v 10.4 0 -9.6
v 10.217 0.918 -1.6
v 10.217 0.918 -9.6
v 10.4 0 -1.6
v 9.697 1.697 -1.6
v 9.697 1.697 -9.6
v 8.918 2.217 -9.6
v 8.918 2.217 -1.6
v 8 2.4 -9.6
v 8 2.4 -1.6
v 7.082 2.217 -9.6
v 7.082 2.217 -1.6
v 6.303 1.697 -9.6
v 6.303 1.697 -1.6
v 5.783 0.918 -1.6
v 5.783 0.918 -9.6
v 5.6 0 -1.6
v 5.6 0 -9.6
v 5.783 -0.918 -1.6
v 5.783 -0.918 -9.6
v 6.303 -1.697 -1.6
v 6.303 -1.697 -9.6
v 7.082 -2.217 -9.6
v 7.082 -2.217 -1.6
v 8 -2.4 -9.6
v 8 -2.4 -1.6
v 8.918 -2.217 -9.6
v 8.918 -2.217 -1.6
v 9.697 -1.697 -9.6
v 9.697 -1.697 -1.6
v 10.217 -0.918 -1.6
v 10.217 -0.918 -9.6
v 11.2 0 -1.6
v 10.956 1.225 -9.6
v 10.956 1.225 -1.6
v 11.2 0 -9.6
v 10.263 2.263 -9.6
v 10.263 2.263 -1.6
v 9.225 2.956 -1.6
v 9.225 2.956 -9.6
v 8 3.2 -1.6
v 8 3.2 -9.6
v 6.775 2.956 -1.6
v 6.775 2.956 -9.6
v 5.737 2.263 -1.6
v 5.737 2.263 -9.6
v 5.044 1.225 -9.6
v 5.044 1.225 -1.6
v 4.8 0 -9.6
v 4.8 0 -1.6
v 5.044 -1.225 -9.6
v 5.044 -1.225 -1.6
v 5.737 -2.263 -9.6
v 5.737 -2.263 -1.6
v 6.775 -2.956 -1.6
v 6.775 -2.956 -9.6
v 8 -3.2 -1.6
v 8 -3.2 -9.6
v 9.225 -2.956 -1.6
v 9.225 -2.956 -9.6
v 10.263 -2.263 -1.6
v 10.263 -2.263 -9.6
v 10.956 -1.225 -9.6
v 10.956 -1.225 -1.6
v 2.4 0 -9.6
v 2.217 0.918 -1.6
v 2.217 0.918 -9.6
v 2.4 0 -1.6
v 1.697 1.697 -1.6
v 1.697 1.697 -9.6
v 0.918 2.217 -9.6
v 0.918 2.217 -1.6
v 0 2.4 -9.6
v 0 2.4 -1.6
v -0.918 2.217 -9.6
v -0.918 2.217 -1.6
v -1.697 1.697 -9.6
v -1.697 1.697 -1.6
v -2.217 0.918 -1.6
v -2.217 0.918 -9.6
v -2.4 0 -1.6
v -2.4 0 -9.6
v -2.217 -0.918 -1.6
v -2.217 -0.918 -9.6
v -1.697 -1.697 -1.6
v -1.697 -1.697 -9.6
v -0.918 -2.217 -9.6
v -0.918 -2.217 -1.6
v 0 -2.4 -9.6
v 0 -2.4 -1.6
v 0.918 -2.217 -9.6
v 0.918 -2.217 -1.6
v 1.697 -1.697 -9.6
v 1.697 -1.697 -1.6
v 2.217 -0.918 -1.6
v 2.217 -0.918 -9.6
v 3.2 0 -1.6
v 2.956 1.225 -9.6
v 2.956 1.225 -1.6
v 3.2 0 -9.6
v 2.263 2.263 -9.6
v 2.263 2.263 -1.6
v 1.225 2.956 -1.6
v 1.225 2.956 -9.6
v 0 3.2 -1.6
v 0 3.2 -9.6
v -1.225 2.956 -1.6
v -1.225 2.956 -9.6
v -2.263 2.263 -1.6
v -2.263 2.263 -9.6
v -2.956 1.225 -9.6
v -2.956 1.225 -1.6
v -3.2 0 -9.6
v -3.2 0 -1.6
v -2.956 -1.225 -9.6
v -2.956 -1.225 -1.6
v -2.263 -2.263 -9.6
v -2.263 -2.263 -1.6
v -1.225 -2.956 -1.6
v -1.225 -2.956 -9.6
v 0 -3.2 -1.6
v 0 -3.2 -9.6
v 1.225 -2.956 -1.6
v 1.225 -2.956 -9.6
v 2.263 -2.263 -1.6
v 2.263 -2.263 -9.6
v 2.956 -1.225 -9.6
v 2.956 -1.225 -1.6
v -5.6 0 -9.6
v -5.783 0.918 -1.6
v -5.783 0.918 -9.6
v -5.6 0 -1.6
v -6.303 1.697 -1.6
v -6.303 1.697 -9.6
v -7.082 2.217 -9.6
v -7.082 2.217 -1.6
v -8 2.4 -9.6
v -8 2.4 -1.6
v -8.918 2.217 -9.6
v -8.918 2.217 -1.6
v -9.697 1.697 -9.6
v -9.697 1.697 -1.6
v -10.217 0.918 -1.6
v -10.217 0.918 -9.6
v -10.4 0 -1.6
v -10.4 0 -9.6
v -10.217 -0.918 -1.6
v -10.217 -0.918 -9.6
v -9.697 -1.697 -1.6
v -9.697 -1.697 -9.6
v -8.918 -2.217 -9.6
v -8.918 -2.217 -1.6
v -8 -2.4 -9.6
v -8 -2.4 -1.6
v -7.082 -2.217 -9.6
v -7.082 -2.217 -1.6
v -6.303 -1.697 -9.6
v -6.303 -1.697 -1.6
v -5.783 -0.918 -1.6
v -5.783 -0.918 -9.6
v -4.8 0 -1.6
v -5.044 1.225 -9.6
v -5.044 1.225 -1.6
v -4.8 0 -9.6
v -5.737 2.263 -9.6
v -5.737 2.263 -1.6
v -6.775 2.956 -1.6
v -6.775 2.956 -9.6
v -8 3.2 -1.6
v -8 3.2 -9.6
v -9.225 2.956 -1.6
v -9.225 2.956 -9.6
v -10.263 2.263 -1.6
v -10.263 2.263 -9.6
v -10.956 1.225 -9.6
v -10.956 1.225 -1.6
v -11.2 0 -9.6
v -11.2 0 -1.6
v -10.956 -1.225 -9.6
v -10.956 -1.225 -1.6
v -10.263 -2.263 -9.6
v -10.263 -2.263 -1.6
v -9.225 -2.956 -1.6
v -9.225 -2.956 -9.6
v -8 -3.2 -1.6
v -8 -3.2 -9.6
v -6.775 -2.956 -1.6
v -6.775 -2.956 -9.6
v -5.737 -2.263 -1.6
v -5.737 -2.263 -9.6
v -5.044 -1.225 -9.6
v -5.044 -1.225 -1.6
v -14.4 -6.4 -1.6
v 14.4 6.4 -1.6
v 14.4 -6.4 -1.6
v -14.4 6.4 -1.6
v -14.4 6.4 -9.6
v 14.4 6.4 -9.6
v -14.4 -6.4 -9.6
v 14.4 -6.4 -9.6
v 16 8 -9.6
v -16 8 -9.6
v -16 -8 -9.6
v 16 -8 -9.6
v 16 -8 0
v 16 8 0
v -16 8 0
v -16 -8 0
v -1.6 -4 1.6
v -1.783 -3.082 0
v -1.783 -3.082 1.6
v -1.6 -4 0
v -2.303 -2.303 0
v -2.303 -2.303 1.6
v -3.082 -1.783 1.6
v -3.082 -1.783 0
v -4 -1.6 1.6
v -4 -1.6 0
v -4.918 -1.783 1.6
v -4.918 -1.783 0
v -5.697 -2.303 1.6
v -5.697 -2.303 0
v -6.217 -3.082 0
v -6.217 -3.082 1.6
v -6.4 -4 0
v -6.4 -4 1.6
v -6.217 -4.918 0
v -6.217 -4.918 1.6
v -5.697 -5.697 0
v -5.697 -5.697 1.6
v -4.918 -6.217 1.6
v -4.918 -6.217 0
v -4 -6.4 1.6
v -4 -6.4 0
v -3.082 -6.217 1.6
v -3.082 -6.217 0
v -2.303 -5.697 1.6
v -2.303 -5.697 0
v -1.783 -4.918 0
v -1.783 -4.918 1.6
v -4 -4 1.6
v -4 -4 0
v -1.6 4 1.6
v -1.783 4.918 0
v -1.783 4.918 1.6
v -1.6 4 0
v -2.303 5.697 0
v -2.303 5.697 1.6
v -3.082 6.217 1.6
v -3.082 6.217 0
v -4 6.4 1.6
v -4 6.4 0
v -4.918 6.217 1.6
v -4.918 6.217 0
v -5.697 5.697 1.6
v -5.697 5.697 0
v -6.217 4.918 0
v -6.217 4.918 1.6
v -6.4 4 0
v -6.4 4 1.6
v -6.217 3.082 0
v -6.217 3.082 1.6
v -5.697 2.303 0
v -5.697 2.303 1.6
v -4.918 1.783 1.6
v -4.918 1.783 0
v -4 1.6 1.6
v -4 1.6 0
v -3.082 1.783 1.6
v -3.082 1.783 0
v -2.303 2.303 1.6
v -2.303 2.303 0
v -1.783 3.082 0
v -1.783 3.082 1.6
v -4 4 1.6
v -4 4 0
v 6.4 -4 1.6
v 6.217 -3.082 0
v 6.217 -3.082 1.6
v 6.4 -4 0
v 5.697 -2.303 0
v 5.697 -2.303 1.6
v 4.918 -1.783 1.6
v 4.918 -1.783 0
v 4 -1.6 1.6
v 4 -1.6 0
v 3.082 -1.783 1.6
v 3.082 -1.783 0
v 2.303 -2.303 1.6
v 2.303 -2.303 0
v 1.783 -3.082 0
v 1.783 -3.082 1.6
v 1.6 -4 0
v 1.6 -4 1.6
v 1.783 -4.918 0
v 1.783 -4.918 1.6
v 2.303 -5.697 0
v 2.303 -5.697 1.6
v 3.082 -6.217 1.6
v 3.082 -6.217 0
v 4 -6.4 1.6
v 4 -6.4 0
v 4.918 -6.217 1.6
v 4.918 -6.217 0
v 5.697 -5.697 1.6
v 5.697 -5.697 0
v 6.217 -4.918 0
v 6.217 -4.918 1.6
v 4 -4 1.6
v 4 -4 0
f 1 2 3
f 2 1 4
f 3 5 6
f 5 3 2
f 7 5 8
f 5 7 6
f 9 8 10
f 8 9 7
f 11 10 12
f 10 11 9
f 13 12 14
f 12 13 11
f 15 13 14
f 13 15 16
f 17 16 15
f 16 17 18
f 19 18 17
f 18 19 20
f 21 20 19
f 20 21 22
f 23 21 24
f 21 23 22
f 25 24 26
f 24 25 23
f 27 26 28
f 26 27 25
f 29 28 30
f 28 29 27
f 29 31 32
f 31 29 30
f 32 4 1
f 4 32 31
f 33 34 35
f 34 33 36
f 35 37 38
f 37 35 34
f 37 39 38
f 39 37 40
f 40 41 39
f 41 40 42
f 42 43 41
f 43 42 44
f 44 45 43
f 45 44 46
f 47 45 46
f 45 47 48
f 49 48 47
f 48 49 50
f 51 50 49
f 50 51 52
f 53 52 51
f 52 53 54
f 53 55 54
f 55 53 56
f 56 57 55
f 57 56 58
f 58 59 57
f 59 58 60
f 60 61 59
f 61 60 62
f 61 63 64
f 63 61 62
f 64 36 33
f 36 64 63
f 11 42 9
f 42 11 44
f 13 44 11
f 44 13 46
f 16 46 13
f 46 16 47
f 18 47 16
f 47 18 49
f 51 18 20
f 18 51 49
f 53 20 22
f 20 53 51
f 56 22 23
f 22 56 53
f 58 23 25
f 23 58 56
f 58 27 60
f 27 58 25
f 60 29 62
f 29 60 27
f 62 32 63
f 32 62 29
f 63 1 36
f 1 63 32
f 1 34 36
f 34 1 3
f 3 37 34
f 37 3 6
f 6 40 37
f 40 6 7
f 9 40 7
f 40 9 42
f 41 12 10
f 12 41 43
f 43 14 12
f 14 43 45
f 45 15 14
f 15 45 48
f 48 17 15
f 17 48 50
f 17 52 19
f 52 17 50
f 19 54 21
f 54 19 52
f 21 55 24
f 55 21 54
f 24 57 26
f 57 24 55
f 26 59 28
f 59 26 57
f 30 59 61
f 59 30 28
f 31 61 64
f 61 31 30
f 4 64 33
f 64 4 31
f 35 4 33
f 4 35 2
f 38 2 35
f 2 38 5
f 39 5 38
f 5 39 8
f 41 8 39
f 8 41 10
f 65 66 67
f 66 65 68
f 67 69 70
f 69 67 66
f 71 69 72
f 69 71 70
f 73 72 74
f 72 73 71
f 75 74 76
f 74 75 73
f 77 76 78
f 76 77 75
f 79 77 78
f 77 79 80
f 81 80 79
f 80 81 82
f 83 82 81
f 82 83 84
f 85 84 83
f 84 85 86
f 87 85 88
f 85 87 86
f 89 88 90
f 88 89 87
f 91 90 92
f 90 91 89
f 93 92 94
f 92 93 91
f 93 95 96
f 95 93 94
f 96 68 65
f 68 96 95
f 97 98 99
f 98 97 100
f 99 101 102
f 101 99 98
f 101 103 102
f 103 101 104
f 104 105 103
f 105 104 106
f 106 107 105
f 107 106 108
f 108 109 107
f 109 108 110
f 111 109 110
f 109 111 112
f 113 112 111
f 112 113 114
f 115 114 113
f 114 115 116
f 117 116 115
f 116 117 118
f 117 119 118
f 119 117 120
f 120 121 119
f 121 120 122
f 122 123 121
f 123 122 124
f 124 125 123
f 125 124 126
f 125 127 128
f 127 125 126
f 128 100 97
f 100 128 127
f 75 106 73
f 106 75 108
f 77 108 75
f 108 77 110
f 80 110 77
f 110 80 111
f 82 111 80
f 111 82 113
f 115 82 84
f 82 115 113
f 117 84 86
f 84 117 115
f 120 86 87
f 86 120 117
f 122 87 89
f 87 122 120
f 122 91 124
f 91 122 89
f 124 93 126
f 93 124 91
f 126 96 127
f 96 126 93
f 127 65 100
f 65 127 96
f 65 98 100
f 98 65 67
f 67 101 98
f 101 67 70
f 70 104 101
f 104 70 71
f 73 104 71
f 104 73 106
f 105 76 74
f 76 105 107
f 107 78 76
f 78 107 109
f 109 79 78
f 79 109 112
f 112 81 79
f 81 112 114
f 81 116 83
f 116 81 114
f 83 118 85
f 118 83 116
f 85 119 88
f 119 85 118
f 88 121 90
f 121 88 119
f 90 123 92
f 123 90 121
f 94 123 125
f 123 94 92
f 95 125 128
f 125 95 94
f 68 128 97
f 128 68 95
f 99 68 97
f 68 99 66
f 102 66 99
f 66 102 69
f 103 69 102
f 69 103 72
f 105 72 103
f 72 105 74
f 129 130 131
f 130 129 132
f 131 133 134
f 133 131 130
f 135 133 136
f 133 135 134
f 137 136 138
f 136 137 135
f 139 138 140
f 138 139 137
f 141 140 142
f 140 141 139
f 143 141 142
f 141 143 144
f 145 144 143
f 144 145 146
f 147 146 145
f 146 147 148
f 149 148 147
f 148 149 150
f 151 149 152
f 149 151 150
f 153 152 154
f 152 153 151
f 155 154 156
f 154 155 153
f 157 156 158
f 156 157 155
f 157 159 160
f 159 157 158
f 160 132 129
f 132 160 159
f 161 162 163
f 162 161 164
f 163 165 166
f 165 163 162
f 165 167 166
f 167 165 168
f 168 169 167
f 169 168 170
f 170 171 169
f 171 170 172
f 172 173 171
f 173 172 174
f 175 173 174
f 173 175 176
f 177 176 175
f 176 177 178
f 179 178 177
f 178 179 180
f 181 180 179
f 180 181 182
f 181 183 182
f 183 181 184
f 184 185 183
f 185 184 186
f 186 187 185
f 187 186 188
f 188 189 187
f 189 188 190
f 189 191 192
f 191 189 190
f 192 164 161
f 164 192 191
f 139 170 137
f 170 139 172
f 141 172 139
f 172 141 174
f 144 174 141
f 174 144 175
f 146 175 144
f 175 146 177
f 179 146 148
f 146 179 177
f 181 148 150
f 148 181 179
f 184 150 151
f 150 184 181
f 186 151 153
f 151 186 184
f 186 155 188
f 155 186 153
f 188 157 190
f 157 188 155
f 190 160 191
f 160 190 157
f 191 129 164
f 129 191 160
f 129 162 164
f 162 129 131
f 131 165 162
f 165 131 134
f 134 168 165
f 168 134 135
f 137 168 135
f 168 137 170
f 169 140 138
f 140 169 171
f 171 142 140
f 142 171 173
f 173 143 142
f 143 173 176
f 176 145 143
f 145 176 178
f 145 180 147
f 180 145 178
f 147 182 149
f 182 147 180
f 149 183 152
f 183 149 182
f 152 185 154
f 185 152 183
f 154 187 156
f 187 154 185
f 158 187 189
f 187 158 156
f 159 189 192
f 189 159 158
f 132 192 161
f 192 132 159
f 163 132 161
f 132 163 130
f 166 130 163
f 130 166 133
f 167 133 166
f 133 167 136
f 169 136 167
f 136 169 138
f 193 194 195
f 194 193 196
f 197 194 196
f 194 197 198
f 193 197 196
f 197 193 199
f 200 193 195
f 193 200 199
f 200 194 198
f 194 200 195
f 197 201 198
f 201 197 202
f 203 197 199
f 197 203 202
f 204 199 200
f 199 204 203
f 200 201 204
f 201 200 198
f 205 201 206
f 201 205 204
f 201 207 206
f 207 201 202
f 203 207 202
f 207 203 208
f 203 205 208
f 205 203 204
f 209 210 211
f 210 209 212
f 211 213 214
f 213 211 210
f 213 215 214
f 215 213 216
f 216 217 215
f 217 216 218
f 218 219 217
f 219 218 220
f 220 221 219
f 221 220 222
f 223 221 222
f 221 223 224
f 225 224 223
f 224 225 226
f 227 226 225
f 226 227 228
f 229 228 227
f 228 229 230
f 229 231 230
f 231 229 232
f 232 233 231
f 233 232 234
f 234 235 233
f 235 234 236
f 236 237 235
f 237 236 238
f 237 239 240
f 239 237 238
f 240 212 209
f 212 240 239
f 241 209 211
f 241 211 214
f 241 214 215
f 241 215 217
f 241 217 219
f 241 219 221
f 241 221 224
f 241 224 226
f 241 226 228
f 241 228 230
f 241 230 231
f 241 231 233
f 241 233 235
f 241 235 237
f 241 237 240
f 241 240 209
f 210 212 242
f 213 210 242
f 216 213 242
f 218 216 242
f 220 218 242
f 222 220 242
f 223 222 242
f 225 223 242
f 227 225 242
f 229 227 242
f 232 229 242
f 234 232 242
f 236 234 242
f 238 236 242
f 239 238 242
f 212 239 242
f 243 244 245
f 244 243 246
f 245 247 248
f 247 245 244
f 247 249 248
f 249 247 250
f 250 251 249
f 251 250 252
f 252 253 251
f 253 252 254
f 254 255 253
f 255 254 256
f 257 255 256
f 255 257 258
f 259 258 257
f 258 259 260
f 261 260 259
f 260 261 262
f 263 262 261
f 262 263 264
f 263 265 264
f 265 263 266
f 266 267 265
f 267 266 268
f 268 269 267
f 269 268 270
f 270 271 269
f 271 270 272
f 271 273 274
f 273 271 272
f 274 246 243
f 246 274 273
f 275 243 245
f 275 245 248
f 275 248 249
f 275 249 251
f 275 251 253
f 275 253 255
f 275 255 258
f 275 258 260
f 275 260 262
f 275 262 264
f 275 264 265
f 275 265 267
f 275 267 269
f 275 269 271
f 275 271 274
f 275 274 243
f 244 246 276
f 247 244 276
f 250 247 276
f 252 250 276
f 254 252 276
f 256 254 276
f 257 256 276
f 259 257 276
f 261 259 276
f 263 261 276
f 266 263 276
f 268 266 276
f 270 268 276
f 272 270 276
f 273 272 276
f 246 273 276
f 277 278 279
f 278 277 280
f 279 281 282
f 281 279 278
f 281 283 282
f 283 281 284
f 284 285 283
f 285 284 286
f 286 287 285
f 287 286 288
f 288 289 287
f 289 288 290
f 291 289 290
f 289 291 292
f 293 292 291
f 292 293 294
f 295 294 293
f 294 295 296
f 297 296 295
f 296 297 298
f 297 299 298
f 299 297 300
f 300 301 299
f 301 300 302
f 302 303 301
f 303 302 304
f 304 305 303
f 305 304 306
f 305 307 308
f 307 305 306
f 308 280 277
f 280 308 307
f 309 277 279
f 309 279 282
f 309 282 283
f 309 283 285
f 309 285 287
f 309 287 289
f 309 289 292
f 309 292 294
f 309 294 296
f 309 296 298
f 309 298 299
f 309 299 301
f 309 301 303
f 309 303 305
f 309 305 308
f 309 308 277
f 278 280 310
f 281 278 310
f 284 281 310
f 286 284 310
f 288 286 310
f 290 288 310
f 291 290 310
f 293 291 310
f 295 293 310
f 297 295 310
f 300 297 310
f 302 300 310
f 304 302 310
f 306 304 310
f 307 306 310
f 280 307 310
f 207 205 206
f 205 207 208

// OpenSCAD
// file: ../p/4-4ring3.scad
use <../lib.scad>
$fa=1; $fs=0.2;
function ldraw_lib__4_4ring3(realsolid=false) = [
// 0 Ring  3 x 1.0
// 0 Name: 4-4ring3.dat
// 0 Author: James Jessiman
// 0 !LDRAW_ORG Primitive UPDATE 2009-01
// 0 !LICENSE Licensed under CC BY 2.0 and CC BY 4.0 : see CAreadme.txt
// 
// 0 BFC CERTIFY CCW
  [0,"BFC","CERTIFY"],
  [0,"BFC","CCW"],
// 
// 0 !HISTORY 1998-12-15 [PTadmin] Official Update 1998-10
// 0 !HISTORY 2002-04-05 [hafhead] Added BFC statement
// 0 !HISTORY 2002-04-25 [PTadmin] Official Update 2002-02
// 0 !HISTORY 2007-06-24 [PTadmin] Header formatted for Contributor Agreement
// 0 !HISTORY 2008-07-01 [PTadmin] Official Update 2008-01
// 0 !HISTORY 2008-08-26 [cwdee] Switch polygon winding and rename
// 0 !HISTORY 2009-05-02 [PTadmin] Official Update 2009-01
// 
// 
// 4 16 -1.5308 0 3.6956 -1.1481 0 2.7717 0 0 3 0 0 4
  [4,16,-1.5308,0,3.6956,-1.1481,0,2.7717,0,0,3,0,0,4],
// 4 16 -2.8284 0 2.8284 -2.1213 0 2.1213 -1.1481 0 2.7717 -1.5308 0 3.6956
  [4,16,-2.8284,0,2.8284,-2.1213,0,2.1213,-1.1481,0,2.7717,-1.5308,0,3.6956],
// 4 16 -3.6956 0 1.5308 -2.7717 0 1.1481 -2.1213 0 2.1213 -2.8284 0 2.8284
  [4,16,-3.6956,0,1.5308,-2.7717,0,1.1481,-2.1213,0,2.1213,-2.8284,0,2.8284],
// 4 16 -4 0 0 -3 0 0 -2.7717 0 1.1481 -3.6956 0 1.5308
  [4,16,-4,0,0,-3,0,0,-2.7717,0,1.1481,-3.6956,0,1.5308],
// 4 16 -3.6956 0 -1.5308 -2.7717 0 -1.1481 -3 0 0 -4 0 0
  [4,16,-3.6956,0,-1.5308,-2.7717,0,-1.1481,-3,0,0,-4,0,0],
// 4 16 -2.8284 0 -2.8284 -2.1213 0 -2.1213 -2.7717 0 -1.1481 -3.6956 0 -1.5308
  [4,16,-2.8284,0,-2.8284,-2.1213,0,-2.1213,-2.7717,0,-1.1481,-3.6956,0,-1.5308],
// 4 16 -1.5308 0 -3.6956 -1.1481 0 -2.7717 -2.1213 0 -2.1213 -2.8284 0 -2.8284
  [4,16,-1.5308,0,-3.6956,-1.1481,0,-2.7717,-2.1213,0,-2.1213,-2.8284,0,-2.8284],
// 4 16 0 0 -4 0 0 -3 -1.1481 0 -2.7717 -1.5308 0 -3.6956
  [4,16,0,0,-4,0,0,-3,-1.1481,0,-2.7717,-1.5308,0,-3.6956],
// 4 16 1.5308 0 -3.6956 1.1481 0 -2.7717 0 0 -3 0 0 -4
  [4,16,1.5308,0,-3.6956,1.1481,0,-2.7717,0,0,-3,0,0,-4],
// 4 16 2.8284 0 -2.8284 2.1213 0 -2.1213 1.1481 0 -2.7717 1.5308 0 -3.6956
  [4,16,2.8284,0,-2.8284,2.1213,0,-2.1213,1.1481,0,-2.7717,1.5308,0,-3.6956],
// 4 16 3.6956 0 -1.5308 2.7717 0 -1.1481 2.1213 0 -2.1213 2.8284 0 -2.8284
  [4,16,3.6956,0,-1.5308,2.7717,0,-1.1481,2.1213,0,-2.1213,2.8284,0,-2.8284],
// 4 16 4 0 0 3 0 0 2.7717 0 -1.1481 3.6956 0 -1.5308
  [4,16,4,0,0,3,0,0,2.7717,0,-1.1481,3.6956,0,-1.5308],
// 4 16 3.6956 0 1.5308 2.7717 0 1.1481 3 0 0 4 0 0
  [4,16,3.6956,0,1.5308,2.7717,0,1.1481,3,0,0,4,0,0],
// 4 16 2.8284 0 2.8284 2.1213 0 2.1213 2.7717 0 1.1481 3.6956 0 1.5308
  [4,16,2.8284,0,2.8284,2.1213,0,2.1213,2.7717,0,1.1481,3.6956,0,1.5308],
// 4 16 1.5308 0 3.6956 1.1481 0 2.7717 2.1213 0 2.1213 2.8284 0 2.8284
  [4,16,1.5308,0,3.6956,1.1481,0,2.7717,2.1213,0,2.1213,2.8284,0,2.8284],
// 4 16 0 0 4 0 0 3 1.1481 0 2.7717 1.5308 0 3.6956
  [4,16,0,0,4,0,0,3,1.1481,0,2.7717,1.5308,0,3.6956],
// 0
];
module ldraw_lib__4_4ring3(step=0, col=false, unit=2/5, alt=false, line=0.2, solid=!$preview)
    makepoly(ldraw_lib__4_4ring3(solid), step=step, col=col, unit=unit, alt=alt, line=line, solid=solid);
ldraw_lib__4_4ring3(line=0.2);
// file: ../p/4-4edge.scad
use <../lib.scad>
function ldraw_lib__4_4edge() = [
// 0 Circle 1.0
// 0 Name: 4-4edge.dat
// 0 Author: James Jessiman
// 0 !LDRAW_ORG Primitive UPDATE 2017-01
// 0 !LICENSE Licensed under CC BY 2.0 and CC BY 4.0 : see CAreadme.txt
// 
// 0 BFC CERTIFY CCW
  [0,"BFC","CERTIFY"],
  [0,"BFC","CCW"],
// 
// 0 !HISTORY 1998-12-15 [PTadmin] Official Update 1998-10
// 0 !HISTORY 2005-12-28 [PTadmin] Official Update 2005-01
// 0 !HISTORY 2007-06-24 [PTadmin] Header formatted for Contributor Agreement
// 0 !HISTORY 2008-07-01 [PTadmin] Official Update 2008-01
// 0 !HISTORY 2017-01-15 [Steffen] BFCed
// 0 !HISTORY 2017-12-30 [PTadmin] Official Update 2017-01
// 
// 
// 2 24 1 0 0 0.9239 0 0.3827
  [2,24,1,0,0,0.9239,0,0.3827],
// 2 24 0.9239 0 0.3827 0.7071 0 0.7071
  [2,24,0.9239,0,0.3827,0.7071,0,0.7071],
// 2 24 0.7071 0 0.7071 0.3827 0 0.9239
  [2,24,0.7071,0,0.7071,0.3827,0,0.9239],
// 2 24 0.3827 0 0.9239 0 0 1
  [2,24,0.3827,0,0.9239,0,0,1],
// 2 24 0 0 1 -0.3827 0 0.9239
  [2,24,0,0,1,-0.3827,0,0.9239],
// 2 24 -0.3827 0 0.9239 -0.7071 0 0.7071
  [2,24,-0.3827,0,0.9239,-0.7071,0,0.7071],
// 2 24 -0.7071 0 0.7071 -0.9239 0 0.3827
  [2,24,-0.7071,0,0.7071,-0.9239,0,0.3827],
// 2 24 -0.9239 0 0.3827 -1 0 -0
  [2,24,-0.9239,0,0.3827,-1,0,-0],
// 2 24 -1 0 -0 -0.9239 0 -0.3827
  [2,24,-1,0,-0,-0.9239,0,-0.3827],
// 2 24 -0.9239 0 -0.3827 -0.7071 0 -0.7071
  [2,24,-0.9239,0,-0.3827,-0.7071,0,-0.7071],
// 2 24 -0.7071 0 -0.7071 -0.3827 0 -0.9239
  [2,24,-0.7071,0,-0.7071,-0.3827,0,-0.9239],
// 2 24 -0.3827 0 -0.9239 0 0 -1
  [2,24,-0.3827,0,-0.9239,0,0,-1],
// 2 24 0 0 -1 0.3827 0 -0.9239
  [2,24,0,0,-1,0.3827,0,-0.9239],
// 2 24 0.3827 0 -0.9239 0.7071 0 -0.7071
  [2,24,0.3827,0,-0.9239,0.7071,0,-0.7071],
// 2 24 0.7071 0 -0.7071 0.9239 0 -0.3827
  [2,24,0.7071,0,-0.7071,0.9239,0,-0.3827],
// 2 24 0.9239 0 -0.3827 1 0 0
  [2,24,0.9239,0,-0.3827,1,0,0],
];
module ldraw_lib__4_4edge(step=0, col=false, unit=2/5, alt=false, line=0.2, solid=!$preview)
    makepoly(ldraw_lib__4_4edge(), step=step, col=col, unit=unit, alt=alt, line=line, solid=solid);
ldraw_lib__4_4edge(line=0.2);
// file: ../p/4-4disc.scad
use <../lib.scad>
function ldraw_lib__4_4disc() = [
// 0 Disc 1.0
// 0 Name: 4-4disc.dat
// 0 Author: James Jessiman
// 0 !LDRAW_ORG Primitive UPDATE 2002-02
// 0 !LICENSE Licensed under CC BY 2.0 and CC BY 4.0 : see CAreadme.txt
// 
// 0 BFC CERTIFY CCW
  [0,"BFC","CERTIFY"],
  [0,"BFC","CCW"],
// 
// 0 !HISTORY 1998-12-15 [PTadmin] Official Update 1998-10
// 0 !HISTORY 2002-03-23 [sbliss] Added BFC statement
// 0 !HISTORY 2002-04-25 [PTadmin] Official Update 2002-02
// 0 !HISTORY 2007-06-24 [PTadmin] Header formatted for Contributor Agreement
// 0 !HISTORY 2008-07-01 [PTadmin] Official Update 2008-01
// 
// 
// 3 16 0 0 0 1 0 0 0.9239 0 0.3827
  [3,16,0,0,0,1,0,0,0.9239,0,0.3827],
// 3 16 0 0 0 0.9239 0 0.3827 0.7071 0 0.7071
  [3,16,0,0,0,0.9239,0,0.3827,0.7071,0,0.7071],
// 3 16 0 0 0 0.7071 0 0.7071 0.3827 0 0.9239
  [3,16,0,0,0,0.7071,0,0.7071,0.3827,0,0.9239],
// 3 16 0 0 0 0.3827 0 0.9239 0 0 1
  [3,16,0,0,0,0.3827,0,0.9239,0,0,1],
// 3 16 0 0 0 0 0 1 -0.3827 0 0.9239
  [3,16,0,0,0,0,0,1,-0.3827,0,0.9239],
// 3 16 0 0 0 -0.3827 0 0.9239 -0.7071 0 0.7071
  [3,16,0,0,0,-0.3827,0,0.9239,-0.7071,0,0.7071],
// 3 16 0 0 0 -0.7071 0 0.7071 -0.9239 0 0.3827
  [3,16,0,0,0,-0.7071,0,0.7071,-0.9239,0,0.3827],
// 3 16 0 0 0 -0.9239 0 0.3827 -1 0 -0
  [3,16,0,0,0,-0.9239,0,0.3827,-1,0,-0],
// 3 16 0 0 0 -1 0 -0 -0.9239 0 -0.3827
  [3,16,0,0,0,-1,0,-0,-0.9239,0,-0.3827],
// 3 16 0 0 0 -0.9239 0 -0.3827 -0.7071 0 -0.7071
  [3,16,0,0,0,-0.9239,0,-0.3827,-0.7071,0,-0.7071],
// 3 16 0 0 0 -0.7071 0 -0.7071 -0.3827 0 -0.9239
  [3,16,0,0,0,-0.7071,0,-0.7071,-0.3827,0,-0.9239],
// 3 16 0 0 0 -0.3827 0 -0.9239 0 0 -1
  [3,16,0,0,0,-0.3827,0,-0.9239,0,0,-1],
// 3 16 0 0 0 0 0 -1 0.3827 0 -0.9239
  [3,16,0,0,0,0,0,-1,0.3827,0,-0.9239],
// 3 16 0 0 0 0.3827 0 -0.9239 0.7071 0 -0.7071
  [3,16,0,0,0,0.3827,0,-0.9239,0.7071,0,-0.7071],
// 3 16 0 0 0 0.7071 0 -0.7071 0.9239 0 -0.3827
  [3,16,0,0,0,0.7071,0,-0.7071,0.9239,0,-0.3827],
// 3 16 0 0 0 0.9239 0 -0.3827 1 0 0
  [3,16,0,0,0,0.9239,0,-0.3827,1,0,0],
// 0
];
module ldraw_lib__4_4disc(step=0, col=false, unit=2/5, alt=false, line=0.2, solid=!$preview)
    makepoly(ldraw_lib__4_4disc(), step=step, col=col, unit=unit, alt=alt, line=line, solid=solid);
ldraw_lib__4_4disc(line=0.2);
// file: ../p/4-4cyli.scad
use <../lib.scad>
$fa=1; $fs=0.2;
function ldraw_lib__4_4cyli(realsolid=false) = [
// 0 Cylinder 1.0
// 0 Name: 4-4cyli.dat
// 0 Author: James Jessiman
// 0 !LDRAW_ORG Primitive UPDATE 2005-01
// 0 !LICENSE Licensed under CC BY 2.0 and CC BY 4.0 : see CAreadme.txt
// 
// 0 BFC CERTIFY CCW
  [0,"BFC","CERTIFY"],
  [0,"BFC","CCW"],
// 
// 0 !HISTORY 1998-12-15 [PTadmin] Official Update 1998-10
// 0 !HISTORY 2002-03-23 [sbliss] Added BFC statement; merged headers from files in distributions LDraw 0.27 and Complete.
// 0 !HISTORY 2002-04-25 [PTadmin] Official Update 2002-02
// 0 !HISTORY 2004-12-14 [guyvivan] BFC CCW
// 0 !HISTORY 2005-12-28 [PTadmin] Official Update 2005-01
// 0 !HISTORY 2007-06-24 [PTadmin] Header formatted for Contributor Agreement
// 0 !HISTORY 2008-07-01 [PTadmin] Official Update 2008-01
// 
// 
// 4 16 1 1 0 0.9239 1 0.3827 0.9239 0 0.3827 1 0 0
  [4,16,1,1,0,0.9239,1,0.3827,0.9239,0,0.3827,1,0,0],
// 5 24 1 0 0 1 1 0 0.9239 0 0.3827 0.9239 0 -0.3827
  [5,24,1,0,0,1,1,0,0.9239,0,0.3827,0.9239,0,-0.3827],
// 4 16 0.9239 1 0.3827 0.7071 1 0.7071 0.7071 0 0.7071 0.9239 0 0.3827
  [4,16,0.9239,1,0.3827,0.7071,1,0.7071,0.7071,0,0.7071,0.9239,0,0.3827],
// 5 24 0.9239 0 0.3827 0.9239 1 0.3827 0.7071 0 0.7071 1 0 0
  [5,24,0.9239,0,0.3827,0.9239,1,0.3827,0.7071,0,0.7071,1,0,0],
// 4 16 0.7071 1 0.7071 0.3827 1 0.9239 0.3827 0 0.9239 0.7071 0 0.7071
  [4,16,0.7071,1,0.7071,0.3827,1,0.9239,0.3827,0,0.9239,0.7071,0,0.7071],
// 5 24 0.7071 0 0.7071 0.7071 1 0.7071 0.3827 0 0.9239 0.9239 0 0.3827
  [5,24,0.7071,0,0.7071,0.7071,1,0.7071,0.3827,0,0.9239,0.9239,0,0.3827],
// 4 16 0.3827 1 0.9239 0 1 1 0 0 1 0.3827 0 0.9239
  [4,16,0.3827,1,0.9239,0,1,1,0,0,1,0.3827,0,0.9239],
// 5 24 0.3827 0 0.9239 0.3827 1 0.9239 0 0 1 0.7071 0 0.7071
  [5,24,0.3827,0,0.9239,0.3827,1,0.9239,0,0,1,0.7071,0,0.7071],
// 4 16 0 1 1 -0.3827 1 0.9239 -0.3827 0 0.9239 0 0 1
  [4,16,0,1,1,-0.3827,1,0.9239,-0.3827,0,0.9239,0,0,1],
// 5 24 0 0 1 0 1 1 -0.3827 0 0.9239 0.3827 0 0.9239
  [5,24,0,0,1,0,1,1,-0.3827,0,0.9239,0.3827,0,0.9239],
// 4 16 -0.3827 1 0.9239 -0.7071 1 0.7071 -0.7071 0 0.7071 -0.3827 0 0.9239
  [4,16,-0.3827,1,0.9239,-0.7071,1,0.7071,-0.7071,0,0.7071,-0.3827,0,0.9239],
// 5 24 -0.3827 0 0.9239 -0.3827 1 0.9239 -0.7071 0 0.7071 0 0 1
  [5,24,-0.3827,0,0.9239,-0.3827,1,0.9239,-0.7071,0,0.7071,0,0,1],
// 4 16 -0.7071 1 0.7071 -0.9239 1 0.3827 -0.9239 0 0.3827 -0.7071 0 0.7071
  [4,16,-0.7071,1,0.7071,-0.9239,1,0.3827,-0.9239,0,0.3827,-0.7071,0,0.7071],
// 5 24 -0.7071 0 0.7071 -0.7071 1 0.7071 -0.9239 0 0.3827 -0.3827 0 0.9239
  [5,24,-0.7071,0,0.7071,-0.7071,1,0.7071,-0.9239,0,0.3827,-0.3827,0,0.9239],
// 4 16 -0.9239 1 0.3827 -1 1 0 -1 0 0 -0.9239 0 0.3827
  [4,16,-0.9239,1,0.3827,-1,1,0,-1,0,0,-0.9239,0,0.3827],
// 5 24 -0.9239 0 0.3827 -0.9239 1 0.3827 -1 0 0 -0.7071 0 0.7071
  [5,24,-0.9239,0,0.3827,-0.9239,1,0.3827,-1,0,0,-0.7071,0,0.7071],
// 4 16 -1 1 0 -0.9239 1 -0.3827 -0.9239 0 -0.3827 -1 0 0
  [4,16,-1,1,0,-0.9239,1,-0.3827,-0.9239,0,-0.3827,-1,0,0],
// 5 24 -1 0 0 -1 1 0 -0.9239 0 -0.3827 -0.9239 0 0.3827
  [5,24,-1,0,0,-1,1,0,-0.9239,0,-0.3827,-0.9239,0,0.3827],
// 4 16 -0.9239 1 -0.3827 -0.7071 1 -0.7071 -0.7071 0 -0.7071 -0.9239 0 -0.3827
  [4,16,-0.9239,1,-0.3827,-0.7071,1,-0.7071,-0.7071,0,-0.7071,-0.9239,0,-0.3827],
// 5 24 -0.9239 0 -0.3827 -0.9239 1 -0.3827 -0.7071 0 -0.7071 -1 0 0
  [5,24,-0.9239,0,-0.3827,-0.9239,1,-0.3827,-0.7071,0,-0.7071,-1,0,0],
// 4 16 -0.7071 1 -0.7071 -0.3827 1 -0.9239 -0.3827 0 -0.9239 -0.7071 0 -0.7071
  [4,16,-0.7071,1,-0.7071,-0.3827,1,-0.9239,-0.3827,0,-0.9239,-0.7071,0,-0.7071],
// 5 24 -0.7071 0 -0.7071 -0.7071 1 -0.7071 -0.3827 0 -0.9239 -0.9239 0 -0.3827
  [5,24,-0.7071,0,-0.7071,-0.7071,1,-0.7071,-0.3827,0,-0.9239,-0.9239,0,-0.3827],
// 4 16 -0.3827 1 -0.9239 0 1 -1 0 0 -1 -0.3827 0 -0.9239
  [4,16,-0.3827,1,-0.9239,0,1,-1,0,0,-1,-0.3827,0,-0.9239],
// 5 24 -0.3827 0 -0.9239 -0.3827 1 -0.9239 0 0 -1 -0.7071 0 -0.7071
  [5,24,-0.3827,0,-0.9239,-0.3827,1,-0.9239,0,0,-1,-0.7071,0,-0.7071],
// 4 16 0 1 -1 0.3827 1 -0.9239 0.3827 0 -0.9239 0 0 -1
  [4,16,0,1,-1,0.3827,1,-0.9239,0.3827,0,-0.9239,0,0,-1],
// 5 24 0 0 -1 0 1 -1 0.3827 0 -0.9239 -0.3827 0 -0.9239
  [5,24,0,0,-1,0,1,-1,0.3827,0,-0.9239,-0.3827,0,-0.9239],
// 4 16 0.3827 1 -0.9239 0.7071 1 -0.7071 0.7071 0 -0.7071 0.3827 0 -0.9239
  [4,16,0.3827,1,-0.9239,0.7071,1,-0.7071,0.7071,0,-0.7071,0.3827,0,-0.9239],
// 5 24 0.3827 0 -0.9239 0.3827 1 -0.9239 0.7071 0 -0.7071 0 0 -1
  [5,24,0.3827,0,-0.9239,0.3827,1,-0.9239,0.7071,0,-0.7071,0,0,-1],
// 4 16 0.7071 1 -0.7071 0.9239 1 -0.3827 0.9239 0 -0.3827 0.7071 0 -0.7071
  [4,16,0.7071,1,-0.7071,0.9239,1,-0.3827,0.9239,0,-0.3827,0.7071,0,-0.7071],
// 5 24 0.7071 0 -0.7071 0.7071 1 -0.7071 0.9239 0 -0.3827 0.3827 0 -0.9239
  [5,24,0.7071,0,-0.7071,0.7071,1,-0.7071,0.9239,0,-0.3827,0.3827,0,-0.9239],
// 4 16 0.9239 1 -0.3827 1 1 0 1 0 0 0.9239 0 -0.3827
  [4,16,0.9239,1,-0.3827,1,1,0,1,0,0,0.9239,0,-0.3827],
// 5 24 0.9239 0 -0.3827 0.9239 1 -0.3827 1 0 0 0.7071 0 -0.7071
  [5,24,0.9239,0,-0.3827,0.9239,1,-0.3827,1,0,0,0.7071,0,-0.7071],
// 0
];
module ldraw_lib__4_4cyli(step=0, col=false, unit=2/5, alt=false, line=0.2, solid=!$preview)
    makepoly(ldraw_lib__4_4cyli(solid), step=step, col=col, unit=unit, alt=alt, line=line, solid=solid);
ldraw_lib__4_4cyli(line=0.2);
// file: ../p/stud4.scad
use <../lib.scad>
use <4-4cyli.scad>
use <4-4edge.scad>
use <4-4ring3.scad>
function ldraw_lib__stud4() = [
// 0 Stud Tube Open
// 0 Name: stud4.dat
// 0 Author: James Jessiman
// 0 !LDRAW_ORG Primitive UPDATE 2009-02
// 0 !LICENSE Licensed under CC BY 4.0 : see CAreadme.txt
// 
// 0 BFC CERTIFY CCW
  [0,"BFC","CERTIFY"],
  [0,"BFC","CCW"],
// 
// 0 !HISTORY 1999-07-05 [PTadmin] Official Update 1999-05
// 0 !HISTORY 2002-04-04 [sbliss] Modified for BFC compliance
// 0 !HISTORY 2002-04-25 [PTadmin] Official Update 2002-02
// 0 !HISTORY 2007-06-24 [PTadmin] Header formatted for Contributor Agreement
// 0 !HISTORY 2008-07-01 [PTadmin] Official Update 2008-01
// 0 !HISTORY 2009-06-21 [cwdee] Update ring references to 4-4ring
// 0 !HISTORY 2009-09-03 [PTadmin] Official Update 2009-02
// 
// 
// 1 16 0 -4 0 6 0 0 0 1 0 0 0 6 4-4edge.dat
  [1,16,0,-4,0,6,0,0,0,1,0,0,0,6, ldraw_lib__4_4edge()],
// 1 16 0 -4 0 8 0 0 0 1 0 0 0 8 4-4edge.dat
  [1,16,0,-4,0,8,0,0,0,1,0,0,0,8, ldraw_lib__4_4edge()],
// 1 16 0 0 0 6 0 0 0 1 0 0 0 6 4-4edge.dat
  [1,16,0,0,0,6,0,0,0,1,0,0,0,6, ldraw_lib__4_4edge()],
// 1 16 0 0 0 8 0 0 0 1 0 0 0 8 4-4edge.dat
  [1,16,0,0,0,8,0,0,0,1,0,0,0,8, ldraw_lib__4_4edge()],
// 0 BFC INVERTNEXT
  [0,"BFC","INVERTNEXT"],
// 1 16 0 -4 0 6 0 0 0 4 0 0 0 6 4-4cyli.dat
  [1,16,0,-4,0,6,0,0,0,4,0,0,0,6, ldraw_lib__4_4cyli()],
// 1 16 0 -4 0 8 0 0 0 4 0 0 0 8 4-4cyli.dat
  [1,16,0,-4,0,8,0,0,0,4,0,0,0,8, ldraw_lib__4_4cyli()],
// 1 16 0 -4 0 2 0 0 0 1 0 0 0 2 4-4ring3.dat
  [1,16,0,-4,0,2,0,0,0,1,0,0,0,2, ldraw_lib__4_4ring3()],
  [-1,16,0,0,0,2,0,0,0,-1,0,0,0,2, ldraw_lib__4_4ring3()],
// 0
];
module ldraw_lib__stud4(step=0, col=false, unit=2/5, alt=false, line=0.2, solid=!$preview)
    makepoly(ldraw_lib__stud4(), step=step, col=col, unit=unit, alt=alt, line=line, solid=solid);
ldraw_lib__stud4(line=0.2);
// file: ../p/box5.scad
use <../lib.scad>
function ldraw_lib__box5() = [
// 0 Box with 5 Faces and All Edges
// 0 Name: box5.dat
// 0 Author: James Jessiman
// 0 !LDRAW_ORG Primitive UPDATE 2012-01
// 0 !LICENSE Licensed under CC BY 2.0 and CC BY 4.0 : see CAreadme.txt
// 
// 0 BFC CERTIFY CCW
  [0,"BFC","CERTIFY"],
  [0,"BFC","CCW"],
// 
// 0 !HISTORY 2002-04-03 [sbliss] Modified for BFC compliance
// 0 !HISTORY 2002-04-25 [PTadmin] Official Update 2002-02
// 0 !HISTORY 2007-06-24 [PTadmin] Header formatted for Contributor Agreement
// 0 !HISTORY 2008-07-01 [PTadmin] Official Update 2008-01
// 0 !HISTORY 2012-02-16 [Philo] Changed to CCW
// 0 !HISTORY 2012-03-30 [PTadmin] Official Update 2012-01
// 
// 
// 2 24 1 1 1 -1 1 1
  [2,24,1,1,1,-1,1,1],
// 2 24 -1 1 1 -1 1 -1
  [2,24,-1,1,1,-1,1,-1],
// 2 24 -1 1 -1 1 1 -1
  [2,24,-1,1,-1,1,1,-1],
// 2 24 1 1 -1 1 1 1
  [2,24,1,1,-1,1,1,1],
// 2 24 1 0 1 -1 0 1
  [2,24,1,0,1,-1,0,1],
// 2 24 -1 0 1 -1 0 -1
  [2,24,-1,0,1,-1,0,-1],
// 2 24 -1 0 -1 1 0 -1
  [2,24,-1,0,-1,1,0,-1],
// 2 24 1 0 -1 1 0 1
  [2,24,1,0,-1,1,0,1],
// 2 24 1 0 1 1 1 1
  [2,24,1,0,1,1,1,1],
// 2 24 -1 0 1 -1 1 1
  [2,24,-1,0,1,-1,1,1],
// 2 24 1 0 -1 1 1 -1
  [2,24,1,0,-1,1,1,-1],
// 2 24 -1 0 -1 -1 1 -1
  [2,24,-1,0,-1,-1,1,-1],
// 4 16 -1 1 1 1 1 1 1 1 -1 -1 1 -1
  [4,16,-1,1,1,1,1,1,1,1,-1,-1,1,-1],
// 4 16 -1 1 1 -1 0 1 1 0 1 1 1 1
  [4,16,-1,1,1,-1,0,1,1,0,1,1,1,1],
// 4 16 -1 1 -1 -1 0 -1 -1 0 1 -1 1 1
  [4,16,-1,1,-1,-1,0,-1,-1,0,1,-1,1,1],
// 4 16 1 1 -1 1 0 -1 -1 0 -1 -1 1 -1
  [4,16,1,1,-1,1,0,-1,-1,0,-1,-1,1,-1],
// 4 16 1 1 1 1 0 1 1 0 -1 1 1 -1
  [4,16,1,1,1,1,0,1,1,0,-1,1,1,-1],
];
makepoly(ldraw_lib__box5(), line=0.2);
// file: ../p/box4.scad
use <../lib.scad>
function ldraw_lib__box4() = [
// 0 Box with 4 Faces (2 Parallel Pairs) and All Edges
// 0 Name: box4.dat
// 0 Author: James Jessiman
// 0 !LDRAW_ORG Primitive UPDATE 2012-01
// 0 !LICENSE Licensed under CC BY 4.0 : see CAreadme.txt
// 
// 0 BFC CERTIFY CCW
  [0,"BFC","CERTIFY"],
  [0,"BFC","CCW"],
// 
// 0 !HISTORY 2002-04-03 [sbliss] Modified for BFC compliance
// 0 !HISTORY 2002-04-25 [PTadmin] Official Update 2002-02
// 0 !HISTORY 2007-06-24 [PTadmin] Header formatted for Contributor Agreement
// 0 !HISTORY 2008-07-01 [PTadmin] Official Update 2008-01
// 0 !HISTORY 2012-02-16 [Philo] Changed to CCW
// 0 !HISTORY 2012-03-30 [PTadmin] Official Update 2012-01
// 
// 
// 2 24 1 1 1 -1 1 1
  [2,24,1,1,1,-1,1,1],
// 2 24 -1 1 1 -1 1 -1
  [2,24,-1,1,1,-1,1,-1],
// 2 24 -1 1 -1 1 1 -1
  [2,24,-1,1,-1,1,1,-1],
// 2 24 1 1 -1 1 1 1
  [2,24,1,1,-1,1,1,1],
// 2 24 1 0 1 -1 0 1
  [2,24,1,0,1,-1,0,1],
// 2 24 -1 0 1 -1 0 -1
  [2,24,-1,0,1,-1,0,-1],
// 2 24 -1 0 -1 1 0 -1
  [2,24,-1,0,-1,1,0,-1],
// 2 24 1 0 -1 1 0 1
  [2,24,1,0,-1,1,0,1],
// 2 24 1 0 1 1 1 1
  [2,24,1,0,1,1,1,1],
// 2 24 -1 0 1 -1 1 1
  [2,24,-1,0,1,-1,1,1],
// 2 24 1 0 -1 1 1 -1
  [2,24,1,0,-1,1,1,-1],
// 2 24 -1 0 -1 -1 1 -1
  [2,24,-1,0,-1,-1,1,-1],
// 4 16 -1 1 1 -1 0 1 1 0 1 1 1 1
  [4,16,-1,1,1,-1,0,1,1,0,1,1,1,1],
// 4 16 -1 1 -1 -1 0 -1 -1 0 1 -1 1 1
  [4,16,-1,1,-1,-1,0,-1,-1,0,1,-1,1,1],
// 4 16 1 1 -1 1 0 -1 -1 0 -1 -1 1 -1
  [4,16,1,1,-1,1,0,-1,-1,0,-1,-1,1,-1],
// 4 16 1 1 1 1 0 1 1 0 -1 1 1 -1
  [4,16,1,1,1,1,0,1,1,0,-1,1,1,-1],
];
module ldraw_lib__box4(step=0, col=false, unit=2/5, alt=false, line=0.2, solid=!$preview)
    makepoly(ldraw_lib__box4(), step=step, col=col, unit=unit, alt=alt, line=line, solid=solid);
ldraw_lib__box4(line=0.2);
// file: ../p/stud.scad
use <../lib.scad>
use <4-4cyli.scad>
use <4-4disc.scad>
use <4-4edge.scad>
function ldraw_lib__stud() = [
// 0 Stud
// 0 Name: stud.dat
// 0 Author: James Jessiman
// 0 !LDRAW_ORG Primitive UPDATE 2012-01
// 0 !LICENSE Licensed under CC BY 4.0 : see CAreadme.txt
// 
// 0 BFC CERTIFY CCW
  [0,"BFC","CERTIFY"],
  [0,"BFC","CCW"],
// 
// 0 !HISTORY 2002-04-04 [sbliss] Modified for BFC compliance
// 0 !HISTORY 2002-04-25 [PTadmin] Official Update 2002-02
// 0 !HISTORY 2007-06-24 [PTadmin] Header formatted for Contributor Agreement
// 0 !HISTORY 2008-07-01 [PTadmin] Official Update 2008-01
// 0 !HISTORY 2012-02-16 [Philo] Changed to CCW
// 0 !HISTORY 2012-03-30 [PTadmin] Official Update 2012-01
// 
// 
// 1 16 0 0 0 6 0 0 0 1 0 0 0 6 4-4edge.dat
  [1,16,0,0,0,6,0,0,0,1,0,0,0,6, ldraw_lib__4_4edge()],
// 1 16 0 -4 0 6 0 0 0 1 0 0 0 6 4-4edge.dat
  [1,16,0,-4,0,6,0,0,0,1,0,0,0,6, ldraw_lib__4_4edge()],
// 1 16 0 0 0 6 0 0 0 -4 0 0 0 6 4-4cyli.dat
  [1,16,0,0,0,6,0,0,0,-4,0,0,0,6, ldraw_lib__4_4cyli()],
// 1 16 0 -4 0 6 0 0 0 1 0 0 0 6 4-4disc.dat
  [1,16,0,-4,0,6,0,0,0,1,0,0,0,6, ldraw_lib__4_4disc()],
  [-1,16,0,0,0,6,0,0,0,-1,0,0,0,6, ldraw_lib__4_4disc()],
];
module ldraw_lib__stud(step=0, col=false, unit=2/5, alt=false, line=0.2, solid=!$preview)
    makepoly(ldraw_lib__stud(), step=step, col=col, unit=unit, alt=alt, line=line, solid=solid);
ldraw_lib__stud(line=0.2);
// file: s/3001s02.scad
use <../../lib.scad>
use <../../p/box4.scad>
use <../../p/box5.scad>
use <../../p/stud4.scad>
function ldraw_lib__s__3001s02() = [
// 0 ~Brick  2 x  4 without Top and Top Studs
// 0 Name: s\3001s02.dat
// 0 Author: Rene Rechthaler [Blechtaler]
// 0 !LDRAW_ORG Subpart UPDATE 2024-09
// 0 !LICENSE Licensed under CC BY 4.0 : see CAreadme.txt
// 
// 0 BFC CERTIFY CCW
  [0,"BFC","CERTIFY"],
  [0,"BFC","CCW"],
// 
// 0 !HISTORY 2023-11-20 [Blechtaler] made from 3001s01
// 0 !HISTORY 2024-10-27 [OrionP] Official Update 2024-09
// 
// 1 16 20 4 0 1 0 0 0 -5 0 0 0 1 stud4.dat
  [1,16,20,4,0,1,0,0,0,-5,0,0,0,1, ldraw_lib__stud4()],
// 1 16 0 4 0 1 0 0 0 -5 0 0 0 1 stud4.dat
  [1,16,0,4,0,1,0,0,0,-5,0,0,0,1, ldraw_lib__stud4()],
// 1 16 -20 4 0 1 0 0 0 -5 0 0 0 1 stud4.dat
  [1,16,-20,4,0,1,0,0,0,-5,0,0,0,1, ldraw_lib__stud4()],
// 0 BFC INVERTNEXT
  [0,"BFC","INVERTNEXT"],
// 1 16 0 24 0 36 0 0 0 -20 0 0 0 16 box5.dat
  [1,16,0,24,0,36,0,0,0,-20,0,0,0,16, ldraw_lib__box5()],
// 4 16 40 24 20 36 24 16 -36 24 16 -40 24 20
  [4,16,40,24,20,36,24,16,-36,24,16,-40,24,20],
// 4 16 -40 24 20 -36 24 16 -36 24 -16 -40 24 -20
  [4,16,-40,24,20,-36,24,16,-36,24,-16,-40,24,-20],
// 4 16 -40 24 -20 -36 24 -16 36 24 -16 40 24 -20
  [4,16,-40,24,-20,-36,24,-16,36,24,-16,40,24,-20],
// 4 16 40 24 -20 36 24 -16 36 24 16 40 24 20
  [4,16,40,24,-20,36,24,-16,36,24,16,40,24,20],
// 1 16 0 24 0 0 0 40 0 -24 0 -20 0 0 box4.dat
  [1,16,0,24,0,0,0,40,0,-24,0,-20,0,0, ldraw_lib__box4()],
];
module ldraw_lib__s__3001s02(step=0, col=false, unit=2/5, alt=false, line=0.2, solid=!$preview)
    makepoly(ldraw_lib__s__3001s02(), step=step, col=col, unit=unit, alt=alt, line=line, solid=solid);
ldraw_lib__s__3001s02(line=0.2);
// main file
use <../lib.scad>
use <s/3001s02.scad>
use <../p/stud.scad>
function ldraw_lib__60235() = [
// 0 Brick Braille 2 x 4 with 3 Studs (DOTS-235)
// 0 Name: 60235.dat
// 0 Author: Chris Böhnke [KnightOfTarenta]
// 0 !LDRAW_ORG Part UPDATE 2025-08
// 0 !LICENSE Licensed under CC BY 4.0 : see CAreadme.txt
// 
// 0 BFC CERTIFY CCW
  [0,"BFC","CERTIFY"],
  [0,"BFC","CCW"],
// 
// 0 !HISTORY 2025-08-25 [KnightOfTarenta] Modified from 60235p01.dat by Rene Rechthaler [Blechtaler]
// 0 !HISTORY 2025-08-31 [OrionP] Official Update 2025-08
// 
// 1 16 0 0 0 1 0 0 0 1 0 0 0 1 s\3001s02.dat
  [1,16,0,0,0,1,0,0,0,1,0,0,0,1, ldraw_lib__s__3001s02()],
// 1 16 -10 0 -10 1 0 0 0 1 0 0 0 1 stud.dat
  [1,16,-10,0,-10,1,0,0,0,1,0,0,0,1, ldraw_lib__stud()],
// 1 16 -10 0 10 1 0 0 0 1 0 0 0 1 stud.dat
  [1,16,-10,0,10,1,0,0,0,1,0,0,0,1, ldraw_lib__stud()],
// 1 16 10 0 -10 1 0 0 0 1 0 0 0 1 stud.dat
  [1,16,10,0,-10,1,0,0,0,1,0,0,0,1, ldraw_lib__stud()],
// 
// 0 // Top
// 4 16 40 0 -20 40 0 20 -40 0 20 -40 0 -20
  [4,16,40,0,-20,40,0,20,-40,0,20,-40,0,-20],
];
module ldraw_lib__60235(step=0, col=false, unit=2/5, alt=false, line=0.2, solid=!$preview)
    makepoly(ldraw_lib__60235(), step=step, col=col, unit=unit, alt=alt, line=line, solid=solid);
ldraw_lib__60235(line=0.2);
